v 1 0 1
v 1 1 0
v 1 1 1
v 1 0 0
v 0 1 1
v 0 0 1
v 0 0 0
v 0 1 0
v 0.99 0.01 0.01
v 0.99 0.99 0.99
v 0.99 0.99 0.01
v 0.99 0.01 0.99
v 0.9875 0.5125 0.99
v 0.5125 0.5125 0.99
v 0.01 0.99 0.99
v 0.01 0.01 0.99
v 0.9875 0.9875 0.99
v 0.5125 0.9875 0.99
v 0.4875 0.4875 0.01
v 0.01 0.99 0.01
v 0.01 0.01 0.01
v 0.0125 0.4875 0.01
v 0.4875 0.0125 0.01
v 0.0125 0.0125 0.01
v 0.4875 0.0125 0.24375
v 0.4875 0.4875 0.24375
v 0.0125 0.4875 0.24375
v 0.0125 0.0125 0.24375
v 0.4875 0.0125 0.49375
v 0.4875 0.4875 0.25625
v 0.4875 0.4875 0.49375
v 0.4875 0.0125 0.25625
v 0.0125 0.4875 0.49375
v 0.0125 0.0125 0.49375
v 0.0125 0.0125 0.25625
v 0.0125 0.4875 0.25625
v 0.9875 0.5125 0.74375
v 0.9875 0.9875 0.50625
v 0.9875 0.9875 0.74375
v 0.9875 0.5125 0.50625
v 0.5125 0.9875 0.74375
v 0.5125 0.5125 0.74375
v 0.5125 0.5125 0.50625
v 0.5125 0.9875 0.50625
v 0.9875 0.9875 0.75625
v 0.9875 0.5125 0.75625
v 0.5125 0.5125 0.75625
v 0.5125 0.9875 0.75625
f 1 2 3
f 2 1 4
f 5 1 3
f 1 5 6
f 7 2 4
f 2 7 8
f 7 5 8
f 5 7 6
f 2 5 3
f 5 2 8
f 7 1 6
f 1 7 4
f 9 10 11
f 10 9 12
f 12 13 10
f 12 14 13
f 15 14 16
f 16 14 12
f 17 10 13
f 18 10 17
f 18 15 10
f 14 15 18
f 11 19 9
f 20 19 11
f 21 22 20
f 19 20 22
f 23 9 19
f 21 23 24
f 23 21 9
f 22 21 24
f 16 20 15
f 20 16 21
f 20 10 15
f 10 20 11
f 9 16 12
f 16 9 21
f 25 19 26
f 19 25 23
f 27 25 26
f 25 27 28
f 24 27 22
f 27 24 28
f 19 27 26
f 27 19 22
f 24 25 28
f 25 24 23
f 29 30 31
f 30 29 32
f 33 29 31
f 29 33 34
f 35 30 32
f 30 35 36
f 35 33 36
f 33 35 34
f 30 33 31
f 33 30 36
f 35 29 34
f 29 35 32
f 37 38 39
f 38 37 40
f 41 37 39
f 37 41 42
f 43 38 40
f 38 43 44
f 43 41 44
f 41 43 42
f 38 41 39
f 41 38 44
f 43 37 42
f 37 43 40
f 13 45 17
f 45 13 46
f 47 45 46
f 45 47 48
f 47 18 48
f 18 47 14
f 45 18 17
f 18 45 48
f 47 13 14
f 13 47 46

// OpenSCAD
translate([0.25, 0.25, 0.125]) color([0.5950749074630047, 0.12456443162745168, 0.11278033405214238]) cube([0.475, 0.475, 0.2375], center=true);
translate([0.25, 0.25, 0.375]) color([0.6750262760352327, 0.8623182486784359, 0.9810611581202504]) cube([0.475, 0.475, 0.2375], center=true);
translate([0.75, 0.75, 0.625]) color([0.49978092457778167, 0.6503043584931048, 0.41621840516135633]) cube([0.475, 0.475, 0.2375], center=true);
translate([0.75, 0.75, 0.875]) color([0.9569405127021948, 0.4147644651379754, 0.3939288952081095]) cube([0.475, 0.475, 0.2375], center=true);
color([0.3,0.3,0.3,0.3]) difference() { cube([1,1,1]); translate([0.01,0.01,0.01]) cube([0.98,0.98,0.98]); }
